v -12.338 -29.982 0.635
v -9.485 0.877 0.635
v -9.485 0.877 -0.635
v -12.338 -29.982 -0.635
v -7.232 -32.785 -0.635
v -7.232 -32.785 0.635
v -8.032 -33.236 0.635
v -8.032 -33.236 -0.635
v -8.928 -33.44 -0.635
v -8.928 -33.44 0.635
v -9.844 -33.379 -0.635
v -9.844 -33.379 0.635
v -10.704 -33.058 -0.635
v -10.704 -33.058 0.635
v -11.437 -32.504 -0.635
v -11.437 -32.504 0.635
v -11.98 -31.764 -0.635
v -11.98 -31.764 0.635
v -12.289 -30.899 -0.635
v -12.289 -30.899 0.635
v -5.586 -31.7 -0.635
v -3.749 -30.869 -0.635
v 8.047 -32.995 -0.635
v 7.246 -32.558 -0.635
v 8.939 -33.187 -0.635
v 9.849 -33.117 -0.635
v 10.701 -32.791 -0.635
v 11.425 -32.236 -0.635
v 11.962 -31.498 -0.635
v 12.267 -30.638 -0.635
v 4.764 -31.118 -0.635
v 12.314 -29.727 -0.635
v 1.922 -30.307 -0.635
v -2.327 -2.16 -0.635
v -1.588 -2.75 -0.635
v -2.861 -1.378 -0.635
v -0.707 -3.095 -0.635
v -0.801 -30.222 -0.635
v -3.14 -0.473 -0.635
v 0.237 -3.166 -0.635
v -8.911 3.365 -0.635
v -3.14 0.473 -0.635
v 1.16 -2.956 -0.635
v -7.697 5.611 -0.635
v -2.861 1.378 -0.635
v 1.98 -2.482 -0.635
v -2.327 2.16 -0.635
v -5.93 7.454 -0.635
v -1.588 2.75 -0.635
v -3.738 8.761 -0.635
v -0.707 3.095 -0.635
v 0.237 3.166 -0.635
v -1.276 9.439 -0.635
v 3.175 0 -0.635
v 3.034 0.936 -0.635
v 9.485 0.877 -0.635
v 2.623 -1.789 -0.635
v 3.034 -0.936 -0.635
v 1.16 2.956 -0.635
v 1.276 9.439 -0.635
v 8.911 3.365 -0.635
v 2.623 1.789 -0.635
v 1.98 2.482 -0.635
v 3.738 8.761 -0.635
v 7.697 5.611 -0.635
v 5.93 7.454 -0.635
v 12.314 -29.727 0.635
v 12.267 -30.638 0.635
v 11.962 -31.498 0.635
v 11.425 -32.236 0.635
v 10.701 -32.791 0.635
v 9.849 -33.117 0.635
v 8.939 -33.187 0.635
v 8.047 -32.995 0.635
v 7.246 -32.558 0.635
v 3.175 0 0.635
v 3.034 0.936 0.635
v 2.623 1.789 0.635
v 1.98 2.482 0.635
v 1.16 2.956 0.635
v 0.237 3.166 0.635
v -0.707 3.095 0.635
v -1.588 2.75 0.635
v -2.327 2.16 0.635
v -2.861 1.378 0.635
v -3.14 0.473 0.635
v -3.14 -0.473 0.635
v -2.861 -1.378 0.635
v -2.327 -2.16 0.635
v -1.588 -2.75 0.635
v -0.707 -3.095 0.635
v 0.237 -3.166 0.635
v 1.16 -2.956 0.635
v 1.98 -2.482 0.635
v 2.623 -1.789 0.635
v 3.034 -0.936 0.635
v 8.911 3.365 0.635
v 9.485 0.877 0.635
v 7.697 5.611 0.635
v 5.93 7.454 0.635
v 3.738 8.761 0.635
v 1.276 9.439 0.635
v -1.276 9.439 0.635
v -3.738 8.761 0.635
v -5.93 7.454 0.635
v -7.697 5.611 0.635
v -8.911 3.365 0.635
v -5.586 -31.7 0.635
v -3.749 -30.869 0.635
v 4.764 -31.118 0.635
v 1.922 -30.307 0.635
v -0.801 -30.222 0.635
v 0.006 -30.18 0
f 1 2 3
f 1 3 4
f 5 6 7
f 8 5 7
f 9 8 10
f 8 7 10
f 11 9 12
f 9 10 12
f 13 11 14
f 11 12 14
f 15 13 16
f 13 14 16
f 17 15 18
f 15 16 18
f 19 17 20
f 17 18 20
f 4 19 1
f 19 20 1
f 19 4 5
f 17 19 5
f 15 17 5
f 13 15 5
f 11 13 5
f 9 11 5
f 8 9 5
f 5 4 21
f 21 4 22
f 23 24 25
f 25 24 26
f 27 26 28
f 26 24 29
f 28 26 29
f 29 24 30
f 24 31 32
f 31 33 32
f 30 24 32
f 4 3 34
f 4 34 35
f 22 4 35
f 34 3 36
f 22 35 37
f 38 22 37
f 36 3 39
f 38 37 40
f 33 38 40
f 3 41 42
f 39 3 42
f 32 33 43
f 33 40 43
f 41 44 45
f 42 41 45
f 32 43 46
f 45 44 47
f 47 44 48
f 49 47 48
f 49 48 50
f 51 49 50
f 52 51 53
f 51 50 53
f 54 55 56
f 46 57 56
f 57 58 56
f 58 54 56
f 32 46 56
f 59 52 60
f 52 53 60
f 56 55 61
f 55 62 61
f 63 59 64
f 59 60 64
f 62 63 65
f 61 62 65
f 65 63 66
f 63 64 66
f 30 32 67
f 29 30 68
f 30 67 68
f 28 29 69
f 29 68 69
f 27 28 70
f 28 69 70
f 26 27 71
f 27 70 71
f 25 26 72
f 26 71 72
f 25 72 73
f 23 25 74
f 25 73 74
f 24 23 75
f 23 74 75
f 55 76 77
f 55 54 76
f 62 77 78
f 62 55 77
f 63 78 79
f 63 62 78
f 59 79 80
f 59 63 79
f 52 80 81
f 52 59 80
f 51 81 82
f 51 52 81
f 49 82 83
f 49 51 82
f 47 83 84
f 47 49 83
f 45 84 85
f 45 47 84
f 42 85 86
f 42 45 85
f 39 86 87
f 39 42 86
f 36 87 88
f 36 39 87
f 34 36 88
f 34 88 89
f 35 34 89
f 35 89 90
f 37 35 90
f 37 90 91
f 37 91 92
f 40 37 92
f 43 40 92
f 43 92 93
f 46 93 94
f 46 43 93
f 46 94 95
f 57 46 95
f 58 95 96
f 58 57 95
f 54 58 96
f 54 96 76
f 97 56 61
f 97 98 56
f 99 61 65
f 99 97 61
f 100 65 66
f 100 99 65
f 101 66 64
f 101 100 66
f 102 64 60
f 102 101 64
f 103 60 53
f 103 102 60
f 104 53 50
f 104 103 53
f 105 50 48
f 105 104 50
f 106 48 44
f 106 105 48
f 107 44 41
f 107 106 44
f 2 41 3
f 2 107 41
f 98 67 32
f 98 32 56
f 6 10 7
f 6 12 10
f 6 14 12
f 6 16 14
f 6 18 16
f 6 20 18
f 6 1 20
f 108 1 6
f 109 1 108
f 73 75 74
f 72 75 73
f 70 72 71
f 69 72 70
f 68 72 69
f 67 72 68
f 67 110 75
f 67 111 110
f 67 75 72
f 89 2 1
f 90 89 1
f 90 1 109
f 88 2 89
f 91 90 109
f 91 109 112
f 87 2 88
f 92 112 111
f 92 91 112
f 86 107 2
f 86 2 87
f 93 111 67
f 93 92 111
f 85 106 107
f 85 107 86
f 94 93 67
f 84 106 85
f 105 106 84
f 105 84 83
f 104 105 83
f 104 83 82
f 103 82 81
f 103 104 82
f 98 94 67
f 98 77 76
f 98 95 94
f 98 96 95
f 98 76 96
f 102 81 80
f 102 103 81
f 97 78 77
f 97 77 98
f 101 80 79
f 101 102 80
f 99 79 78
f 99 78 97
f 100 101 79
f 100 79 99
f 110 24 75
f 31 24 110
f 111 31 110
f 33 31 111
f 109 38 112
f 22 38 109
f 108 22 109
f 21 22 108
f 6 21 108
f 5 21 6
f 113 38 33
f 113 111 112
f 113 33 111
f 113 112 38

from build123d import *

# Parameters (mm, degrees)
SKETCH1_R           = 3.175
BOSS_EXTRUDE1_DEPTH = 0.635
CUT_EXTRUDE1_START  = -0.635
CUT_EXTRUDE1_DEPTH  = 1.27
CUT_EXTRUDE2_DEPTH  = 37.222840302


# Read off the part's stored shape, not the designer's step: Cut-Extrude1
with BuildPart() as part:
    # Sketch1 → Boss-Extrude1 (new, symmetric)
    with BuildSketch(Plane.XY):
        with BuildLine():
            Line((-9.484545184, 0.876942223), (-12.7, -33.89972345))
            Line((-12.7, -33.89972345), (12.7, -33.89972345))
            Line((12.7, -33.89972345), (9.484545184, 0.876942223))
            ThreePointArc((9.484545184, 0.876942223), (0, 9.525), (-9.484545184, 0.876942223))
        make_face()
        Circle(SKETCH1_R, mode=Mode.SUBTRACT)
    extrude(amount=BOSS_EXTRUDE1_DEPTH, both=True)

    # Cut-Extrude1 outline → Cut-Extrude1 (cut)
    with BuildSketch(Plane.XY.offset(CUT_EXTRUDE1_START)):
        with BuildLine():
            Line((-8.497954961, -33.89972345), (8.76063713, -33.89972345))
            add(Edge.make_bspline(
                [(8.76063713, -33.89972345), (0.306373234, -25.111661594), (-8.497954961, -33.89972345)],
                knots=[2.496380088, 2.496380088, 2.496380088, 3.988409978, 3.988409978, 3.988409978], degree=2, weights=[1, 0.73439942, 1]))
        make_face()
    extrude(amount=CUT_EXTRUDE1_DEPTH, mode=Mode.SUBTRACT)

    # Sketch3 → Cut-Extrude2 (cut, through all)
    with BuildSketch(Plane.XY.offset(0.635)):
        with BuildLine():
            Line((8.76063713, -33.89972345), (12.7, -33.89972345))
            Line((12.7, -33.89972345), (12.314154974, -29.726626876))
            ThreePointArc((12.314154974, -29.726626876), (10.7009799, -32.790811849), (7.245953049, -32.557674927))
            add(Edge.make_bspline(
                [(8.76063713, -33.89972345), (8.051791445, -33.162890557), (7.245953049, -32.557674927)],
                knots=[2.496380088, 2.496380088, 2.496380088, 2.651046381, 2.651046381, 2.651046381], degree=2, weights=[1, 0.997011282, 1]))
        make_face()
        with BuildLine():
            Line((-12.7, -33.89972345), (-8.497954961, -33.89972345))
            add(Edge.make_bspline(
                [(-7.23241505, -32.785101753), (-7.896265785, -33.299145918), (-8.497954961, -33.89972345)],
                knots=[3.862260272, 3.862260272, 3.862260272, 3.988409978, 3.988409978, 3.988409978], degree=2, weights=[1, 0.998011441, 1]))
            ThreePointArc((-7.23241505, -32.785101753), (-10.704172961, -33.057927648), (-12.337805101, -29.982414196))
            Line((-12.337805101, -29.982414196), (-12.7, -33.89972345))
        make_face()
    extrude(amount=-CUT_EXTRUDE2_DEPTH, mode=Mode.SUBTRACT)


solid = part.part
